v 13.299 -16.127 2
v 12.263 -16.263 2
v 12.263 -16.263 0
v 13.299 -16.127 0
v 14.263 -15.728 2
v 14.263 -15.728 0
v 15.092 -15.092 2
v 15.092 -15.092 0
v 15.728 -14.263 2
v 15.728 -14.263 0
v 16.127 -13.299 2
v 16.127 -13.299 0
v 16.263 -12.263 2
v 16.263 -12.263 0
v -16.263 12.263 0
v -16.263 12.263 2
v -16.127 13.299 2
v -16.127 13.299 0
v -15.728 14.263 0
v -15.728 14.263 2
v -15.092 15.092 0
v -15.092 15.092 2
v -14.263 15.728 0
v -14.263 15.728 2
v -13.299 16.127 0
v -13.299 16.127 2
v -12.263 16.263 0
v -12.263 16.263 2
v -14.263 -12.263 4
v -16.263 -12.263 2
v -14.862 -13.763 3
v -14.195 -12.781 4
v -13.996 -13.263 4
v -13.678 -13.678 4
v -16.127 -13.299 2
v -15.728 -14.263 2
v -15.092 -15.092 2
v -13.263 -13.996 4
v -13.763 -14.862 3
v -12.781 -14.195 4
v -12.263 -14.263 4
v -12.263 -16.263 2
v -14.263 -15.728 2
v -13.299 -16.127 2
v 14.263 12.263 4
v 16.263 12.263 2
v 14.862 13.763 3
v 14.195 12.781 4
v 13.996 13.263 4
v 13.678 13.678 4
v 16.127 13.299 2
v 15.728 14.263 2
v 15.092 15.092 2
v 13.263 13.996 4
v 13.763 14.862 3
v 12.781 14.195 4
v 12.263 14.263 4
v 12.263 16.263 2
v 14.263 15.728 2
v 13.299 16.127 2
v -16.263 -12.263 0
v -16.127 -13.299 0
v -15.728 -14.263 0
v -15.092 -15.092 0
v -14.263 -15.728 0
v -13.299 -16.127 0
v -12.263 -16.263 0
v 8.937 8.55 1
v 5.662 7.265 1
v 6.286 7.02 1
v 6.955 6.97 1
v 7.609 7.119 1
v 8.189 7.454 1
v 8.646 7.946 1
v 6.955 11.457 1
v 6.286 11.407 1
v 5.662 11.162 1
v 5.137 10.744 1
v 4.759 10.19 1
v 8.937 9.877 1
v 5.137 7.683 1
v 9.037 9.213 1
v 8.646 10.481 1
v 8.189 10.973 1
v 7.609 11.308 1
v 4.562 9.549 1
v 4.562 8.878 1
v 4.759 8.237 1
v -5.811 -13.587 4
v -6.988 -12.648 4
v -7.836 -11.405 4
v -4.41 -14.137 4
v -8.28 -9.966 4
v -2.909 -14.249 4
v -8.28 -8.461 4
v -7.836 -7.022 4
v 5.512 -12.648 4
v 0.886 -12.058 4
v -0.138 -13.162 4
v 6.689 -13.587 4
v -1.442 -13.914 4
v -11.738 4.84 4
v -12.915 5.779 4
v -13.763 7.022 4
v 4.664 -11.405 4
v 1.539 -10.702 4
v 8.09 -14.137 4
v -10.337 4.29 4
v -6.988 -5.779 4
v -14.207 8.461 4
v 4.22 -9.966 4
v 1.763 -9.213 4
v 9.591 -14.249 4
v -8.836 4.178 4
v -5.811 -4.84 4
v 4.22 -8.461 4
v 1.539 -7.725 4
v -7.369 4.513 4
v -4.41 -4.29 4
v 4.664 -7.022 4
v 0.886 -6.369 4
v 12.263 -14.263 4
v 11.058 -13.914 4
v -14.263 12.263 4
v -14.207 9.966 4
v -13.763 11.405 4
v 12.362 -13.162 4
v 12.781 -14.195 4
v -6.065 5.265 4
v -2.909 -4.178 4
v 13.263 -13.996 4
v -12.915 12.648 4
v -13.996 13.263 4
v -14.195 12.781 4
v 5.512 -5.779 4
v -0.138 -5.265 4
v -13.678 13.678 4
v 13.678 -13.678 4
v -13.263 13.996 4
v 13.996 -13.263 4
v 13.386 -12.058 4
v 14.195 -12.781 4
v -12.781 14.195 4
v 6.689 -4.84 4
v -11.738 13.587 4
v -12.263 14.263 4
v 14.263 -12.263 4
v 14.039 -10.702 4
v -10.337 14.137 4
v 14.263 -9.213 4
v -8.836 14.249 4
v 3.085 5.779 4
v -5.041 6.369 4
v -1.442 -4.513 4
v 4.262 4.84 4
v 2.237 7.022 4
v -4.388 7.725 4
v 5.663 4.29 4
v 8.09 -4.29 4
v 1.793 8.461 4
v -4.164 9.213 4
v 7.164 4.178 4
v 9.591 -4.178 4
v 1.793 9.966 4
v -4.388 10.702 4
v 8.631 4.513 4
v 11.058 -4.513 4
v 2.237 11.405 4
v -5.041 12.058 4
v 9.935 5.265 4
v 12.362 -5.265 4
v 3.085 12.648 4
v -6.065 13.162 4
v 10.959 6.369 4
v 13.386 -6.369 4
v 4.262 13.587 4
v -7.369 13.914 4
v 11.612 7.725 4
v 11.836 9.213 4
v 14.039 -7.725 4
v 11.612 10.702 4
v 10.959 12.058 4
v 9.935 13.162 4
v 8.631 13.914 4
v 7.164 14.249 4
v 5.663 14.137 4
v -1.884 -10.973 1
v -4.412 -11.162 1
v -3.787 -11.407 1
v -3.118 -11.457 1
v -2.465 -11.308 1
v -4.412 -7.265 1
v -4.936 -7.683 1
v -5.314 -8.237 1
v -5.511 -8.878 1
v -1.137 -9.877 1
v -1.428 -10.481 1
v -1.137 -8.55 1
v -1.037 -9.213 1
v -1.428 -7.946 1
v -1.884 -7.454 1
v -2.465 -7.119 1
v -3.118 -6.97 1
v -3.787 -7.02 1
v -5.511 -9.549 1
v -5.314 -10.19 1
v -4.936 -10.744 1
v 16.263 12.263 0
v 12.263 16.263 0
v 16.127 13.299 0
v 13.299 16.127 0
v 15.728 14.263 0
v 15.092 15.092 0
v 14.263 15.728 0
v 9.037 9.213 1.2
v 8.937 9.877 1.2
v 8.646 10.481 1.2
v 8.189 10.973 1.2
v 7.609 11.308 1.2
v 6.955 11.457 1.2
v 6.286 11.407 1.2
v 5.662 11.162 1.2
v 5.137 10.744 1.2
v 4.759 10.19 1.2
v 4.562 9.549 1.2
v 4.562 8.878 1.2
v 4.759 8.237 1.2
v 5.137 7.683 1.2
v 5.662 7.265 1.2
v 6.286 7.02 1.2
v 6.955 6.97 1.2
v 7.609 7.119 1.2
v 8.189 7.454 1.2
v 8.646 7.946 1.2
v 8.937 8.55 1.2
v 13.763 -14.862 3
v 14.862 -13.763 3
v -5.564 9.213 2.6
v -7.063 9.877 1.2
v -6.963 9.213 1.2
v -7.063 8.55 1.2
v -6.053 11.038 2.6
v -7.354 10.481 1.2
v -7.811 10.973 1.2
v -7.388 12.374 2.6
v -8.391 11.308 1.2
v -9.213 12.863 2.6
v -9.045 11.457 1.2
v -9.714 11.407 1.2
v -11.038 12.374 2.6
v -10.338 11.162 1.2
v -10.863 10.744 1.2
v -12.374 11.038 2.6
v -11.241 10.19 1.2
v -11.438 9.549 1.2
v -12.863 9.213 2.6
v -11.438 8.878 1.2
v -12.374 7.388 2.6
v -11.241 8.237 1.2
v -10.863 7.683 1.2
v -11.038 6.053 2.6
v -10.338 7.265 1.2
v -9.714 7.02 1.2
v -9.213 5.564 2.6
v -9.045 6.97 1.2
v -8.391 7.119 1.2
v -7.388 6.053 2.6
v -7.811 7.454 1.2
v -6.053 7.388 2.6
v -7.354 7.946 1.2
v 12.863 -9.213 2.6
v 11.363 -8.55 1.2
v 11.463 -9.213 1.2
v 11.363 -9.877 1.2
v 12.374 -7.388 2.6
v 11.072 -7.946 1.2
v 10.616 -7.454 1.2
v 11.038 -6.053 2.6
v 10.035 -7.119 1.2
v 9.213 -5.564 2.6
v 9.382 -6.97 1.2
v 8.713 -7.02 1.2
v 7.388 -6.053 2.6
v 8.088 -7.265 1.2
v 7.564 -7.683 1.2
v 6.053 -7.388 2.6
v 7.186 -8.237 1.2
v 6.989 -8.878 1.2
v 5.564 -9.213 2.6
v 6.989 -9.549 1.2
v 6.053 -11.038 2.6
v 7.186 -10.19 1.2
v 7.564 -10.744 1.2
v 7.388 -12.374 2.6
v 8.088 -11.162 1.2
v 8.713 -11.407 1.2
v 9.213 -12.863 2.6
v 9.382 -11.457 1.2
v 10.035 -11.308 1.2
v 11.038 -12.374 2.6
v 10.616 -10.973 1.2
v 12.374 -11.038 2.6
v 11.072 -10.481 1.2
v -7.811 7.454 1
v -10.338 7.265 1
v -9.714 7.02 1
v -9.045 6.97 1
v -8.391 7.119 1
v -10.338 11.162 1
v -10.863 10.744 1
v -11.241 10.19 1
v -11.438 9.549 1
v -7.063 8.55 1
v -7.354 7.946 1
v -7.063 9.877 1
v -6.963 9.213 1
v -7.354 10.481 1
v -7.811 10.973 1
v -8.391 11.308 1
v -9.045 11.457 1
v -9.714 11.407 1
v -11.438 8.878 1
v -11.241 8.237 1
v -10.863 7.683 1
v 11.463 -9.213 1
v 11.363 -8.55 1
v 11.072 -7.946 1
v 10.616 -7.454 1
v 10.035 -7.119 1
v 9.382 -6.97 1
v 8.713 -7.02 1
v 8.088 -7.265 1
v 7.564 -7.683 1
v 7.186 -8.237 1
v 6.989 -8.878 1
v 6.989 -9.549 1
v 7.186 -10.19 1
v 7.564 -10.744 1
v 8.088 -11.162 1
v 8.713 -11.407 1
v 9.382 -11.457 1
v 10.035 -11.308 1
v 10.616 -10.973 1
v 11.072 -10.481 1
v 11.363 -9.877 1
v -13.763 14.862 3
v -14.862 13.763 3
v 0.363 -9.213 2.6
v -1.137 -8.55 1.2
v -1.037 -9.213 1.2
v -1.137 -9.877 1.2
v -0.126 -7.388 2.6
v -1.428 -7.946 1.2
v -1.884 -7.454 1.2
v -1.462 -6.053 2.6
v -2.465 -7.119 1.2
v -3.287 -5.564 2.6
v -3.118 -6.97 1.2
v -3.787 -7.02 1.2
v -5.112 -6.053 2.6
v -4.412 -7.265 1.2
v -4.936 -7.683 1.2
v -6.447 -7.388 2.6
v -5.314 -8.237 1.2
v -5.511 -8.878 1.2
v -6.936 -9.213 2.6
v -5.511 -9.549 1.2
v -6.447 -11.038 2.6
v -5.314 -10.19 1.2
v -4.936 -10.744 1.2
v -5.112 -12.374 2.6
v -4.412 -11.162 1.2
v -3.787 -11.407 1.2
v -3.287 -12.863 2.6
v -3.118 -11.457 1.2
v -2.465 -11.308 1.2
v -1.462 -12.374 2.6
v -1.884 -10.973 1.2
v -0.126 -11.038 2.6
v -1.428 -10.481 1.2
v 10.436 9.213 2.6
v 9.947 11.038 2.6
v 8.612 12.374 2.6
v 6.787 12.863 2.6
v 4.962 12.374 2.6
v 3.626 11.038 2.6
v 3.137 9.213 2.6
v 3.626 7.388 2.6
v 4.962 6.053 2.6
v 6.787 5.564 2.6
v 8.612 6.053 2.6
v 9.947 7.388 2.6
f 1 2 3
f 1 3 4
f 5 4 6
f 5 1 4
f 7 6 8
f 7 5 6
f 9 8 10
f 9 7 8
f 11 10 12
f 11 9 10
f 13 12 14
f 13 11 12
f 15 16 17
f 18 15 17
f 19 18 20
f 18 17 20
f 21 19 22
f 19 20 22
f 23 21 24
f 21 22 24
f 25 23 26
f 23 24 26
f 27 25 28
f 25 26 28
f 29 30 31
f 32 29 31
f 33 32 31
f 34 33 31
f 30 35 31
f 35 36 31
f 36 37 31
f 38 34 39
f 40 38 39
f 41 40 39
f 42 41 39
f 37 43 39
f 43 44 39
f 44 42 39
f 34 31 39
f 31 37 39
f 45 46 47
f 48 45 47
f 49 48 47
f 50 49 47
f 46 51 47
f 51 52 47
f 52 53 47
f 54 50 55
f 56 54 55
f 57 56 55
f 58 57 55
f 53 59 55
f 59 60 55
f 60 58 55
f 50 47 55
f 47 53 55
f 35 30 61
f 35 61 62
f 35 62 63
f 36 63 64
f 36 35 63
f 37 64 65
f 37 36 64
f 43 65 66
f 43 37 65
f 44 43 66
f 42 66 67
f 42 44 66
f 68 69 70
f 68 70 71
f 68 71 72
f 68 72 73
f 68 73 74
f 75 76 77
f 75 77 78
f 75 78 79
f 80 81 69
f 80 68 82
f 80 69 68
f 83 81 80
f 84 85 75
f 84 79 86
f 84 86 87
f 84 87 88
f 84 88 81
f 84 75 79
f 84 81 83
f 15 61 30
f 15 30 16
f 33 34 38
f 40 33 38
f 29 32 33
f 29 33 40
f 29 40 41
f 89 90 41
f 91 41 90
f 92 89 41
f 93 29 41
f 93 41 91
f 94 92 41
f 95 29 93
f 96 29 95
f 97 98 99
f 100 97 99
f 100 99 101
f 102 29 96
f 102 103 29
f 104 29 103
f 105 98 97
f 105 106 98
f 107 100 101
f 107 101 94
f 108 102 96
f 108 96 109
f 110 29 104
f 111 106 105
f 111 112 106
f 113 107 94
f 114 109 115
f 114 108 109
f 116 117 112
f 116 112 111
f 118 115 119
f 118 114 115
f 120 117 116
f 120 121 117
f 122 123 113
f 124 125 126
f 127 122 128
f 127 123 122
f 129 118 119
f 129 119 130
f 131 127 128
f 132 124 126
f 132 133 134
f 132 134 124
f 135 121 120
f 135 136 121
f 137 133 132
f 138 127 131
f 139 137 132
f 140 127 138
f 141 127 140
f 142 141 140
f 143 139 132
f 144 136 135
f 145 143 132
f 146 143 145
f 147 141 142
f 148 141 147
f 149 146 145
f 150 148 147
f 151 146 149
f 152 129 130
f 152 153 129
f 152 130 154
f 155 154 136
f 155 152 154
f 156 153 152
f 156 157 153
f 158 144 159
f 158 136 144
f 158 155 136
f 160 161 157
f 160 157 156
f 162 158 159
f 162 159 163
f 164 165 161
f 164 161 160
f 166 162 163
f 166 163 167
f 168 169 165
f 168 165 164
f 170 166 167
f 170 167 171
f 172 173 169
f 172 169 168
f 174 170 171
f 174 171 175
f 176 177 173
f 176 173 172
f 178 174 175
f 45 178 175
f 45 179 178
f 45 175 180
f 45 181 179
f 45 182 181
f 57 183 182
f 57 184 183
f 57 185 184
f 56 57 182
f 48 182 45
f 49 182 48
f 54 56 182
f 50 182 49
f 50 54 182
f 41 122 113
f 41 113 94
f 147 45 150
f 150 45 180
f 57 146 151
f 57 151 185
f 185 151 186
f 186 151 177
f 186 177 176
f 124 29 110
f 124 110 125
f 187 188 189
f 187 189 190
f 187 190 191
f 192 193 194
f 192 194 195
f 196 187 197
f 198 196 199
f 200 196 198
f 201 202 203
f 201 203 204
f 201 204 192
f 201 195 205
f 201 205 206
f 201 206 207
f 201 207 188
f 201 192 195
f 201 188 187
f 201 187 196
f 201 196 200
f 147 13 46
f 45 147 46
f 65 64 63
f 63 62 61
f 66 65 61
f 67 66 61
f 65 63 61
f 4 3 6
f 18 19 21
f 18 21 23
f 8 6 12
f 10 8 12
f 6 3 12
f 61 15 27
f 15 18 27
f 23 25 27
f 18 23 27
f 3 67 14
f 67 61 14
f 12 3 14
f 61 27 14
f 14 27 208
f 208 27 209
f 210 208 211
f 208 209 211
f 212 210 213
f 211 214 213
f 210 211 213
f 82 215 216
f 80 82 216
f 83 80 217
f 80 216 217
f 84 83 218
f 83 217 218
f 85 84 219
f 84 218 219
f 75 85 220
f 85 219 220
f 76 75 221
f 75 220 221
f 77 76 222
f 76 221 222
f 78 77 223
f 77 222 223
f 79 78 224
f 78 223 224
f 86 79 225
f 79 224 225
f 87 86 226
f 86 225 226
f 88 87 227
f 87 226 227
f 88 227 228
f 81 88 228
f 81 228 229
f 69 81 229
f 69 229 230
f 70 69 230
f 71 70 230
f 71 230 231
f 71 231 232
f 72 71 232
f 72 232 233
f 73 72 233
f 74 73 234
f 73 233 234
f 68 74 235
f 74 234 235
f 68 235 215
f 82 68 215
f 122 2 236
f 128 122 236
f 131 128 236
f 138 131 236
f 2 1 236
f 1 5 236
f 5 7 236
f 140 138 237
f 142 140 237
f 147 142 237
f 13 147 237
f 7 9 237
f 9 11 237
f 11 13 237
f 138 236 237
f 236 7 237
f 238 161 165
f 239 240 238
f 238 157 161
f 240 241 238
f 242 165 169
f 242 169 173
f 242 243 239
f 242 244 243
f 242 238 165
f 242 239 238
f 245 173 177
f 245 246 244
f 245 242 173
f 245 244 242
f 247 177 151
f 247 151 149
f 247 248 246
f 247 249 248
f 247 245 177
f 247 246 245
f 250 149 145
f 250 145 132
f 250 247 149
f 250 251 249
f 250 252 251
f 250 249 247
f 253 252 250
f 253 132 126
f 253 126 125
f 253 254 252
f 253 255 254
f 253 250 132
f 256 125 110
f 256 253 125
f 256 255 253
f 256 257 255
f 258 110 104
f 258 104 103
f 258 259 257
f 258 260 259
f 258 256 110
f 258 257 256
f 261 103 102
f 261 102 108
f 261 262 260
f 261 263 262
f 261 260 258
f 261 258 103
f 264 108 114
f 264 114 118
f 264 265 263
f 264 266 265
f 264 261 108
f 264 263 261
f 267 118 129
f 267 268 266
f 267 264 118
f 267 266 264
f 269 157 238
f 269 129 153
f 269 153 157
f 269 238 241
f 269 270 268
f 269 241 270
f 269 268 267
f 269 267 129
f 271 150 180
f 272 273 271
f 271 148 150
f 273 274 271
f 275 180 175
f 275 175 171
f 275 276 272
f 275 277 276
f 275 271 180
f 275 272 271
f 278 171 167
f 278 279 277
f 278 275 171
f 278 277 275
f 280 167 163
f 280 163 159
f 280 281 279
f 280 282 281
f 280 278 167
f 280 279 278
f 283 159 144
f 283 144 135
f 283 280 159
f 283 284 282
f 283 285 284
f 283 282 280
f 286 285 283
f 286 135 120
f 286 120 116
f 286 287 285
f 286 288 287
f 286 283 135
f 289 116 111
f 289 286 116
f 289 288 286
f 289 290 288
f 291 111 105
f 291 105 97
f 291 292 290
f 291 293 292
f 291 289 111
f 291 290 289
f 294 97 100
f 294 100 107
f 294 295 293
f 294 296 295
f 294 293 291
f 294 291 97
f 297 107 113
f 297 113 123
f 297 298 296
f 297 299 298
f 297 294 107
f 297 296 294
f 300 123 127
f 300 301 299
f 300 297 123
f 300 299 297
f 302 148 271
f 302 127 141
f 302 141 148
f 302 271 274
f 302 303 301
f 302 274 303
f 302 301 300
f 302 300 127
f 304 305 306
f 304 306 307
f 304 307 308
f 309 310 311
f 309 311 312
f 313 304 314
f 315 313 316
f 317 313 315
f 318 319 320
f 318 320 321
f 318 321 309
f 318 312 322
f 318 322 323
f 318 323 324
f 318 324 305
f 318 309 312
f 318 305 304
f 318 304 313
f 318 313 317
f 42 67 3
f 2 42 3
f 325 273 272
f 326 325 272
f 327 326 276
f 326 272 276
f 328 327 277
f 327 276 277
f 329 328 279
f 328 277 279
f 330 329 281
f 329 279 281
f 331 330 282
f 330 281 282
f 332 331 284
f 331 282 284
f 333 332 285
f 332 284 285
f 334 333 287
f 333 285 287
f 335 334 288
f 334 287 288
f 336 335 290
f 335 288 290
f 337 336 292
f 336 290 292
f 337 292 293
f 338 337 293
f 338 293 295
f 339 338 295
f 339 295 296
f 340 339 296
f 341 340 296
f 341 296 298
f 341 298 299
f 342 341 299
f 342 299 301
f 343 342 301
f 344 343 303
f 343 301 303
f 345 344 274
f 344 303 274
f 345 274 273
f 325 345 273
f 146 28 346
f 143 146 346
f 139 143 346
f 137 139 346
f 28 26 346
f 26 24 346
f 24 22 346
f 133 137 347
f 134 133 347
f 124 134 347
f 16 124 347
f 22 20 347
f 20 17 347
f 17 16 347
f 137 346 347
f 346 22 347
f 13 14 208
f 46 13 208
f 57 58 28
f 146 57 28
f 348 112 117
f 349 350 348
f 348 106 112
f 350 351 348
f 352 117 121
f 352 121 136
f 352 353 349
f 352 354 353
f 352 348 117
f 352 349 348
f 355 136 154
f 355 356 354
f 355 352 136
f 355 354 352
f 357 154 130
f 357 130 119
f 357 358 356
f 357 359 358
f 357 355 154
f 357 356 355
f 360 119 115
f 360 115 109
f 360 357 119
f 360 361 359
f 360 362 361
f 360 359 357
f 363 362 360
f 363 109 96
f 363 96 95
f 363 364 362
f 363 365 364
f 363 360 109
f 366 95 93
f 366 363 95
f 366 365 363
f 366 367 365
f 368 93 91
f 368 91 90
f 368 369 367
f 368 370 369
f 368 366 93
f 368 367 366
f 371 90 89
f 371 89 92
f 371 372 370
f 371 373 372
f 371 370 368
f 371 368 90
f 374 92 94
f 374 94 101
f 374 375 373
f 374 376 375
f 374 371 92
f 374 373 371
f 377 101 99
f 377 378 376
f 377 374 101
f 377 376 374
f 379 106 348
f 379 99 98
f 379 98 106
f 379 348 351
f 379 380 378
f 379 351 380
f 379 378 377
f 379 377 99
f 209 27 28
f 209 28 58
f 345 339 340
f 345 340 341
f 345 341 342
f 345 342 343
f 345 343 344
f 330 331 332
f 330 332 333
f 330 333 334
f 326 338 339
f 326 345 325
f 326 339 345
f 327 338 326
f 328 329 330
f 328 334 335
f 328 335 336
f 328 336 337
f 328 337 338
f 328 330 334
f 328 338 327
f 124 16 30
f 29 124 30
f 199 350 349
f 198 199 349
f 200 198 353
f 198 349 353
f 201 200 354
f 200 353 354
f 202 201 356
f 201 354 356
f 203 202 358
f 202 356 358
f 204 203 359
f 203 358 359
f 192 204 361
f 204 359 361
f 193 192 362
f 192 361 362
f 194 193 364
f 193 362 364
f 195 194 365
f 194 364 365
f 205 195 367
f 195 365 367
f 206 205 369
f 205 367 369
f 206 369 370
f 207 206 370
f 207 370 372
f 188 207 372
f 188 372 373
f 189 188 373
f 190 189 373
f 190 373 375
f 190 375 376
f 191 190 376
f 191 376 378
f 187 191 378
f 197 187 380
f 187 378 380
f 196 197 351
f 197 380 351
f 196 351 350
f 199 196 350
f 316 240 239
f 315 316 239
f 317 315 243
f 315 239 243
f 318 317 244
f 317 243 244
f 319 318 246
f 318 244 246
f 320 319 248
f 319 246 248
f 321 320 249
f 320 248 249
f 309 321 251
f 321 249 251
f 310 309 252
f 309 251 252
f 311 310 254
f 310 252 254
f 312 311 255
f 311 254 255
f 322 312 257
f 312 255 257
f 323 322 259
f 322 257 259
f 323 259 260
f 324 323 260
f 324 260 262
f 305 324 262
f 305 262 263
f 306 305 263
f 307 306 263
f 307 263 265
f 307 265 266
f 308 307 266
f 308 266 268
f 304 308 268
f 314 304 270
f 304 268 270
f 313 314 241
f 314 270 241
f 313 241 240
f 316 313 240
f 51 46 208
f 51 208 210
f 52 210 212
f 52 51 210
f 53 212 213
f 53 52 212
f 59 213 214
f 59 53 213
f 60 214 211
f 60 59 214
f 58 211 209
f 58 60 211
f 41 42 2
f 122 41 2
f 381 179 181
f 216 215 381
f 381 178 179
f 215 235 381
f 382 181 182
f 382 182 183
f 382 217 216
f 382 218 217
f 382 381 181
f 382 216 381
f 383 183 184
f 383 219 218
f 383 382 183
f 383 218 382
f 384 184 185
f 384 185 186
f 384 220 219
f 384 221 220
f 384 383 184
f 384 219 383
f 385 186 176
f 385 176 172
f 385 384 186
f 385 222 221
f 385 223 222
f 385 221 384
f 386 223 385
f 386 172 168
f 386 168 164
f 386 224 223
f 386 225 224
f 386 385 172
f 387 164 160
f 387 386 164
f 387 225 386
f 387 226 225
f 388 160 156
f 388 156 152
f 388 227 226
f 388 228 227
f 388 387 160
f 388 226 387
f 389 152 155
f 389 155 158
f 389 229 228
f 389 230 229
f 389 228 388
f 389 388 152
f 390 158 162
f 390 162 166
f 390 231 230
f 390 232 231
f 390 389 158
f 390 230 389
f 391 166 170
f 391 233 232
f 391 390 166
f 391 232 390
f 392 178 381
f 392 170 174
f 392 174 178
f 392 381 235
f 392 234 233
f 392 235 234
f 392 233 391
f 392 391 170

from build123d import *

# Parameters (mm, degrees)
SKETCH1_W           = 32.526911934
SKETCH1_H           = 32.526911934
BOSS_EXTRUDE1_DEPTH = 4
FILLET1_R           = 4
CHAMFER1_SIZE       = 2
SKETCH2_R           = 2.25
CUT_EXTRUDE1_DEPTH  = 3
CHAMFER2_SIZE       = 2.8


with BuildPart() as part:
    # Sketch1 → Boss-Extrude1 (new body)
    with BuildSketch(Plane.XY):
        Rectangle(SKETCH1_W, SKETCH1_H)
    extrude(amount=BOSS_EXTRUDE1_DEPTH)

    # Fillet1
    fillet1_edges = [part.edges().sort_by_distance(p)[0] for p in [
        (-16.263455967, 16.263455967, 2),
        (16.263455967, 16.263455967, 2),
        (16.263455967, -16.263455967, 2),
        (-16.263455967, -16.263455967, 2),
    ]]
    fillet(fillet1_edges, radius=FILLET1_R)

    # Chamfer1
    chamfer1_edges = [part.edges().sort_by_distance(p)[0] for p in [
        (0, -16.263455967, 4),
        (-16.263455967, 0, 4),
        (16.263455967, 0, 4),
        (0, 16.263455967, 4),
        (-15.091883092, 15.091883092, 4),
        (15.091883092, 15.091883092, 4),
        (15.091883092, -15.091883092, 4),
        (-15.091883092, -15.091883092, 4),
    ]]
    chamfer(chamfer1_edges, length=CHAMFER1_SIZE)

    # Sketch2 → Cut-Extrude1 (cut)
    with BuildSketch(Plane.XY.offset(4)):
        with Locations((-9.213455967, 9.213455967)):
            Circle(SKETCH2_R)
        with Locations((9.213455967, -9.213455967)):
            Circle(SKETCH2_R)
        with Locations((-3.286544033, -9.213455967)):
            Circle(SKETCH2_R)
        with Locations((6.786544033, 9.213455967)):
            Circle(SKETCH2_R)
    extrude(amount=-CUT_EXTRUDE1_DEPTH, mode=Mode.SUBTRACT)

    # Chamfer2
    chamfer2_edges = [part.edges().sort_by_distance(p)[0] for p in [
        (-11.463455967, 9.213455967, 4),
        (6.963455967, -9.213455967, 4),
        (-5.536544033, -9.213455967, 4),
        (4.536544033, 9.213455967, 4),
    ]]
    chamfer(chamfer2_edges, length=CHAMFER2_SIZE - 0.0001)  # a hair under: the kernel refuses the full size


solid = part.part
